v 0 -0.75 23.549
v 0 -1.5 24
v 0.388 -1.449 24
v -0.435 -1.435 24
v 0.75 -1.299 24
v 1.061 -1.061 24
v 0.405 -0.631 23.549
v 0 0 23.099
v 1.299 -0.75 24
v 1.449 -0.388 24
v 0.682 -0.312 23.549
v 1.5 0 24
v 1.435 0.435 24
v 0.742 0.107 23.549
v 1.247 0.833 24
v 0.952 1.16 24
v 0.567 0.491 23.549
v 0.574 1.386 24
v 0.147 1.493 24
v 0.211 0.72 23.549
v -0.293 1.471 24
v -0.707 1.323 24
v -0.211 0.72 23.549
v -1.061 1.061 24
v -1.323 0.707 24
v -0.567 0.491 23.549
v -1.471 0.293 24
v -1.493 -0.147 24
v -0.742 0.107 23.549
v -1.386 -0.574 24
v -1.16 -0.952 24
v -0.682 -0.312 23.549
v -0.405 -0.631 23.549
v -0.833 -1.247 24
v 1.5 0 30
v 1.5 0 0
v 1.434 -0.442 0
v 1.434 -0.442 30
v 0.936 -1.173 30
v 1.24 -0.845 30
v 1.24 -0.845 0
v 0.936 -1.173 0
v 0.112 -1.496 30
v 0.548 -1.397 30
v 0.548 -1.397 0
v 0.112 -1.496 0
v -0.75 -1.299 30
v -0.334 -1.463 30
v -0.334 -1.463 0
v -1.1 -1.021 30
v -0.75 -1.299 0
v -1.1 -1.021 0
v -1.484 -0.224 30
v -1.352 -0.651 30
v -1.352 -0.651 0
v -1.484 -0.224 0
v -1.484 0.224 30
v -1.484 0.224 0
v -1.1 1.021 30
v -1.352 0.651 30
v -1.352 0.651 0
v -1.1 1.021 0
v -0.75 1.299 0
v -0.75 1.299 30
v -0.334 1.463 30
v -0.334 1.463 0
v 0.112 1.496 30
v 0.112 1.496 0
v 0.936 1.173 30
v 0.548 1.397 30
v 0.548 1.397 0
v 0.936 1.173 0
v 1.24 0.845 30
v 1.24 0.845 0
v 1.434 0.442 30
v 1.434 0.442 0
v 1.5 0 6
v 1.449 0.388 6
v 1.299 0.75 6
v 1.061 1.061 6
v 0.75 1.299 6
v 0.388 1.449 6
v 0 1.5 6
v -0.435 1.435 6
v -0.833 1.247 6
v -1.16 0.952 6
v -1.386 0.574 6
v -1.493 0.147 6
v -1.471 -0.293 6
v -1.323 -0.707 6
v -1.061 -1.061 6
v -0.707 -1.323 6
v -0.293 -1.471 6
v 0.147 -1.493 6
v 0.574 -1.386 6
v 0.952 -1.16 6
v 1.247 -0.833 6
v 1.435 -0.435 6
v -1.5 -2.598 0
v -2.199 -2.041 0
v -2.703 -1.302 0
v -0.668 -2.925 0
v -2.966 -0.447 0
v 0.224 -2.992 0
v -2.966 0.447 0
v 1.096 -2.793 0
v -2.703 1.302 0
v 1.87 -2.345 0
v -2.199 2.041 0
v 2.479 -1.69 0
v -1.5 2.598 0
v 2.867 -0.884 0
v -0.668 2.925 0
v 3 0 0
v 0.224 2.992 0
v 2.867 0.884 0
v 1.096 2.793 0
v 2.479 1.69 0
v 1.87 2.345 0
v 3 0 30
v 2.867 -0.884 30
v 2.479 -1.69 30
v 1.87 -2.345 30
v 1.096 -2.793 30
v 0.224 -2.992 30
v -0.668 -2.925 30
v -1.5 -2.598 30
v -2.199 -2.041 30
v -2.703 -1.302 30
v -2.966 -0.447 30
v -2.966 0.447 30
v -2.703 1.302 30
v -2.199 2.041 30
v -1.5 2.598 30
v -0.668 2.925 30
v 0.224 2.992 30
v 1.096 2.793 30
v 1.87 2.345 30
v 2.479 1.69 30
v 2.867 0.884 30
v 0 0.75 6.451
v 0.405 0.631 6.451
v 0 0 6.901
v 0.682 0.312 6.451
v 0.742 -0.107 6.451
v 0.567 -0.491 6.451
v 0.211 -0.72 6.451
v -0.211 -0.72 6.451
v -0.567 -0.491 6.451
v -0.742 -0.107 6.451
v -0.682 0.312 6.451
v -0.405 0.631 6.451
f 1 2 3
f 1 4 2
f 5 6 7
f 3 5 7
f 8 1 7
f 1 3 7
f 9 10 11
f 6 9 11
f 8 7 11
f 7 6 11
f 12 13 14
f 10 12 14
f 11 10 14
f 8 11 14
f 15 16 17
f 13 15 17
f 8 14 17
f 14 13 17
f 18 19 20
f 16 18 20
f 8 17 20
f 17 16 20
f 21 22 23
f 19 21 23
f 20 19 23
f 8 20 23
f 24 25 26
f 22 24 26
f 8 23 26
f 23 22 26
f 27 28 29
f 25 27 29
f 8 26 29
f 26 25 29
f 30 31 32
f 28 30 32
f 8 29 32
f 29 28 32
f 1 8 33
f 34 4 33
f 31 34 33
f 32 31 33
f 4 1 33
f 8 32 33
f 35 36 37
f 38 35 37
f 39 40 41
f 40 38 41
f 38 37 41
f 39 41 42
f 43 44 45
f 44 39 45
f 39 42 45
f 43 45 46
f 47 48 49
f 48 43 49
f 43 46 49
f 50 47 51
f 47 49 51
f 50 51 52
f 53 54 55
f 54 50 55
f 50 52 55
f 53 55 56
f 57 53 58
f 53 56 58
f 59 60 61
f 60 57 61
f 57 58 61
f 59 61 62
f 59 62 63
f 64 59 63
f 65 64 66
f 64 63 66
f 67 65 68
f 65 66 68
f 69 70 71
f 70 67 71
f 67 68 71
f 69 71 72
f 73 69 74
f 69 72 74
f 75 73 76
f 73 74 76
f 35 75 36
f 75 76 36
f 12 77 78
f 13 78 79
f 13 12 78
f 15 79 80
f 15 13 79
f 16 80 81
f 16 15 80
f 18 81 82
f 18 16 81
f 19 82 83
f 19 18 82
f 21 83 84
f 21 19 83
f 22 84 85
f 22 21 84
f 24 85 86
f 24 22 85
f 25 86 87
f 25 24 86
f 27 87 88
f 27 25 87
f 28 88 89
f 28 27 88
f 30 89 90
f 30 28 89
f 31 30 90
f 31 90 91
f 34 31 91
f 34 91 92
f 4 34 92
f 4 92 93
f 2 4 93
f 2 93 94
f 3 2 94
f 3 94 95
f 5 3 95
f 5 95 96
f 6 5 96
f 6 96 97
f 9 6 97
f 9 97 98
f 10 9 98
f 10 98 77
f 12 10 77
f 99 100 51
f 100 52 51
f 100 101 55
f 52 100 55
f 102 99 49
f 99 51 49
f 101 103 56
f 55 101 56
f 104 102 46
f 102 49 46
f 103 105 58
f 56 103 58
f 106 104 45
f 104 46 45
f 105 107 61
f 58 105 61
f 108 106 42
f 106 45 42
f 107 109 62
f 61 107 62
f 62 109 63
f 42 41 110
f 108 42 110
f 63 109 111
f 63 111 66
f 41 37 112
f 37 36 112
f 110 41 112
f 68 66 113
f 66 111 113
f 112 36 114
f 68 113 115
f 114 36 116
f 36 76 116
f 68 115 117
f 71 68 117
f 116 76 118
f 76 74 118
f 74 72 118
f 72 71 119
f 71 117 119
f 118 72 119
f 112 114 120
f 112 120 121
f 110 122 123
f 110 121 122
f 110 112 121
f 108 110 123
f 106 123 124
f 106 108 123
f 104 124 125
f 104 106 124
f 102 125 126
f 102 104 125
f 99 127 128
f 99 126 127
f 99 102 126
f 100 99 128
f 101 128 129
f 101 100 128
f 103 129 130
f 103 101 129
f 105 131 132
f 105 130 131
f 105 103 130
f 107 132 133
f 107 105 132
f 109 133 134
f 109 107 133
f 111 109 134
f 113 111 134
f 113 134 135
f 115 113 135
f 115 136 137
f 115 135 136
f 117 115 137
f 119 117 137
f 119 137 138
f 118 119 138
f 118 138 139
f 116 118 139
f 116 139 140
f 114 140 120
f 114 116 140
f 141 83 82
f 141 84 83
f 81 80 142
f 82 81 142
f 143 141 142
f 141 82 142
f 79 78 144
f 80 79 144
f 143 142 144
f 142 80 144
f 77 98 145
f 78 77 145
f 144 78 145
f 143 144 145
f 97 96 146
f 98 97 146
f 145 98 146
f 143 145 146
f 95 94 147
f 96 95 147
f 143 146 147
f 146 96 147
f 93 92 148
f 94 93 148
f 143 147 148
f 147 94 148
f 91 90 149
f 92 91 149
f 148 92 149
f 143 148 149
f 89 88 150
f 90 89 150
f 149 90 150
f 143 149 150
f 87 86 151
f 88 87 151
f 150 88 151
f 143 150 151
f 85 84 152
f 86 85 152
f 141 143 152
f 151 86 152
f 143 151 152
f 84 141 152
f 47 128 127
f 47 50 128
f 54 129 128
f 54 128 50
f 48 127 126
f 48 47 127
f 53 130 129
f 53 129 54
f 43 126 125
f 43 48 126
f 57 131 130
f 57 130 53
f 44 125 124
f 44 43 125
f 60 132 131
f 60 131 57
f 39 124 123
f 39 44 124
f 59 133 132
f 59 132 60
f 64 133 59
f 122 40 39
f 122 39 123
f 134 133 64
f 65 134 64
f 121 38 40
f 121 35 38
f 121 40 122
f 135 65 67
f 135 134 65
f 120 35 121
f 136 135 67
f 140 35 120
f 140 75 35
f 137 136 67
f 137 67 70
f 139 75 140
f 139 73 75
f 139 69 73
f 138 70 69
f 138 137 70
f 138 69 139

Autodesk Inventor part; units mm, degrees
ref_plane "YZ Plane" through (0, 0, 0) normal (1, 0, 0) x (0, 1, 0)
ref_plane "XZ Plane" through (0, 0, 0) normal (0, 1, 0) x (-1, 0, 0)
ref_plane "XY Plane" through (0, 0, 0) normal (0, 0, 1) x (1, 0, 0)
sketch "スケッチ1" plane through (0, 0, 0) normal (0, 0, 1) x (1, 0, 0)
  circle A0 centre (0, 0) radius 3
  circle A1 centre (0, 0) radius 1.5005
  dimension "d0" = 6
  dimension "d1" = 3.001
extrude "押し出し1" add sketch "スケッチ1" along normal blind 30
sketch "スケッチ2" plane through (0, 0, 30) normal (0, 0, 1) x (1, 0, 0)
  circle A0 centre (0, 0) radius 1.5
  dimension "d4" = 3
extrude "押し出し2" add sketch "スケッチ2" against normal blind 30
hole "穴1" at (0, 0, 30) direction (0, 0, -1) diameter 3 depth 6 tip angle 118
hole "穴2" at (0, 0, 0) direction (0, 0, 1) diameter 3 depth 6 tip angle 118
properties part number "スペーサーm3-30　簡易筒型" material "アルミニウム 2014-T4"
